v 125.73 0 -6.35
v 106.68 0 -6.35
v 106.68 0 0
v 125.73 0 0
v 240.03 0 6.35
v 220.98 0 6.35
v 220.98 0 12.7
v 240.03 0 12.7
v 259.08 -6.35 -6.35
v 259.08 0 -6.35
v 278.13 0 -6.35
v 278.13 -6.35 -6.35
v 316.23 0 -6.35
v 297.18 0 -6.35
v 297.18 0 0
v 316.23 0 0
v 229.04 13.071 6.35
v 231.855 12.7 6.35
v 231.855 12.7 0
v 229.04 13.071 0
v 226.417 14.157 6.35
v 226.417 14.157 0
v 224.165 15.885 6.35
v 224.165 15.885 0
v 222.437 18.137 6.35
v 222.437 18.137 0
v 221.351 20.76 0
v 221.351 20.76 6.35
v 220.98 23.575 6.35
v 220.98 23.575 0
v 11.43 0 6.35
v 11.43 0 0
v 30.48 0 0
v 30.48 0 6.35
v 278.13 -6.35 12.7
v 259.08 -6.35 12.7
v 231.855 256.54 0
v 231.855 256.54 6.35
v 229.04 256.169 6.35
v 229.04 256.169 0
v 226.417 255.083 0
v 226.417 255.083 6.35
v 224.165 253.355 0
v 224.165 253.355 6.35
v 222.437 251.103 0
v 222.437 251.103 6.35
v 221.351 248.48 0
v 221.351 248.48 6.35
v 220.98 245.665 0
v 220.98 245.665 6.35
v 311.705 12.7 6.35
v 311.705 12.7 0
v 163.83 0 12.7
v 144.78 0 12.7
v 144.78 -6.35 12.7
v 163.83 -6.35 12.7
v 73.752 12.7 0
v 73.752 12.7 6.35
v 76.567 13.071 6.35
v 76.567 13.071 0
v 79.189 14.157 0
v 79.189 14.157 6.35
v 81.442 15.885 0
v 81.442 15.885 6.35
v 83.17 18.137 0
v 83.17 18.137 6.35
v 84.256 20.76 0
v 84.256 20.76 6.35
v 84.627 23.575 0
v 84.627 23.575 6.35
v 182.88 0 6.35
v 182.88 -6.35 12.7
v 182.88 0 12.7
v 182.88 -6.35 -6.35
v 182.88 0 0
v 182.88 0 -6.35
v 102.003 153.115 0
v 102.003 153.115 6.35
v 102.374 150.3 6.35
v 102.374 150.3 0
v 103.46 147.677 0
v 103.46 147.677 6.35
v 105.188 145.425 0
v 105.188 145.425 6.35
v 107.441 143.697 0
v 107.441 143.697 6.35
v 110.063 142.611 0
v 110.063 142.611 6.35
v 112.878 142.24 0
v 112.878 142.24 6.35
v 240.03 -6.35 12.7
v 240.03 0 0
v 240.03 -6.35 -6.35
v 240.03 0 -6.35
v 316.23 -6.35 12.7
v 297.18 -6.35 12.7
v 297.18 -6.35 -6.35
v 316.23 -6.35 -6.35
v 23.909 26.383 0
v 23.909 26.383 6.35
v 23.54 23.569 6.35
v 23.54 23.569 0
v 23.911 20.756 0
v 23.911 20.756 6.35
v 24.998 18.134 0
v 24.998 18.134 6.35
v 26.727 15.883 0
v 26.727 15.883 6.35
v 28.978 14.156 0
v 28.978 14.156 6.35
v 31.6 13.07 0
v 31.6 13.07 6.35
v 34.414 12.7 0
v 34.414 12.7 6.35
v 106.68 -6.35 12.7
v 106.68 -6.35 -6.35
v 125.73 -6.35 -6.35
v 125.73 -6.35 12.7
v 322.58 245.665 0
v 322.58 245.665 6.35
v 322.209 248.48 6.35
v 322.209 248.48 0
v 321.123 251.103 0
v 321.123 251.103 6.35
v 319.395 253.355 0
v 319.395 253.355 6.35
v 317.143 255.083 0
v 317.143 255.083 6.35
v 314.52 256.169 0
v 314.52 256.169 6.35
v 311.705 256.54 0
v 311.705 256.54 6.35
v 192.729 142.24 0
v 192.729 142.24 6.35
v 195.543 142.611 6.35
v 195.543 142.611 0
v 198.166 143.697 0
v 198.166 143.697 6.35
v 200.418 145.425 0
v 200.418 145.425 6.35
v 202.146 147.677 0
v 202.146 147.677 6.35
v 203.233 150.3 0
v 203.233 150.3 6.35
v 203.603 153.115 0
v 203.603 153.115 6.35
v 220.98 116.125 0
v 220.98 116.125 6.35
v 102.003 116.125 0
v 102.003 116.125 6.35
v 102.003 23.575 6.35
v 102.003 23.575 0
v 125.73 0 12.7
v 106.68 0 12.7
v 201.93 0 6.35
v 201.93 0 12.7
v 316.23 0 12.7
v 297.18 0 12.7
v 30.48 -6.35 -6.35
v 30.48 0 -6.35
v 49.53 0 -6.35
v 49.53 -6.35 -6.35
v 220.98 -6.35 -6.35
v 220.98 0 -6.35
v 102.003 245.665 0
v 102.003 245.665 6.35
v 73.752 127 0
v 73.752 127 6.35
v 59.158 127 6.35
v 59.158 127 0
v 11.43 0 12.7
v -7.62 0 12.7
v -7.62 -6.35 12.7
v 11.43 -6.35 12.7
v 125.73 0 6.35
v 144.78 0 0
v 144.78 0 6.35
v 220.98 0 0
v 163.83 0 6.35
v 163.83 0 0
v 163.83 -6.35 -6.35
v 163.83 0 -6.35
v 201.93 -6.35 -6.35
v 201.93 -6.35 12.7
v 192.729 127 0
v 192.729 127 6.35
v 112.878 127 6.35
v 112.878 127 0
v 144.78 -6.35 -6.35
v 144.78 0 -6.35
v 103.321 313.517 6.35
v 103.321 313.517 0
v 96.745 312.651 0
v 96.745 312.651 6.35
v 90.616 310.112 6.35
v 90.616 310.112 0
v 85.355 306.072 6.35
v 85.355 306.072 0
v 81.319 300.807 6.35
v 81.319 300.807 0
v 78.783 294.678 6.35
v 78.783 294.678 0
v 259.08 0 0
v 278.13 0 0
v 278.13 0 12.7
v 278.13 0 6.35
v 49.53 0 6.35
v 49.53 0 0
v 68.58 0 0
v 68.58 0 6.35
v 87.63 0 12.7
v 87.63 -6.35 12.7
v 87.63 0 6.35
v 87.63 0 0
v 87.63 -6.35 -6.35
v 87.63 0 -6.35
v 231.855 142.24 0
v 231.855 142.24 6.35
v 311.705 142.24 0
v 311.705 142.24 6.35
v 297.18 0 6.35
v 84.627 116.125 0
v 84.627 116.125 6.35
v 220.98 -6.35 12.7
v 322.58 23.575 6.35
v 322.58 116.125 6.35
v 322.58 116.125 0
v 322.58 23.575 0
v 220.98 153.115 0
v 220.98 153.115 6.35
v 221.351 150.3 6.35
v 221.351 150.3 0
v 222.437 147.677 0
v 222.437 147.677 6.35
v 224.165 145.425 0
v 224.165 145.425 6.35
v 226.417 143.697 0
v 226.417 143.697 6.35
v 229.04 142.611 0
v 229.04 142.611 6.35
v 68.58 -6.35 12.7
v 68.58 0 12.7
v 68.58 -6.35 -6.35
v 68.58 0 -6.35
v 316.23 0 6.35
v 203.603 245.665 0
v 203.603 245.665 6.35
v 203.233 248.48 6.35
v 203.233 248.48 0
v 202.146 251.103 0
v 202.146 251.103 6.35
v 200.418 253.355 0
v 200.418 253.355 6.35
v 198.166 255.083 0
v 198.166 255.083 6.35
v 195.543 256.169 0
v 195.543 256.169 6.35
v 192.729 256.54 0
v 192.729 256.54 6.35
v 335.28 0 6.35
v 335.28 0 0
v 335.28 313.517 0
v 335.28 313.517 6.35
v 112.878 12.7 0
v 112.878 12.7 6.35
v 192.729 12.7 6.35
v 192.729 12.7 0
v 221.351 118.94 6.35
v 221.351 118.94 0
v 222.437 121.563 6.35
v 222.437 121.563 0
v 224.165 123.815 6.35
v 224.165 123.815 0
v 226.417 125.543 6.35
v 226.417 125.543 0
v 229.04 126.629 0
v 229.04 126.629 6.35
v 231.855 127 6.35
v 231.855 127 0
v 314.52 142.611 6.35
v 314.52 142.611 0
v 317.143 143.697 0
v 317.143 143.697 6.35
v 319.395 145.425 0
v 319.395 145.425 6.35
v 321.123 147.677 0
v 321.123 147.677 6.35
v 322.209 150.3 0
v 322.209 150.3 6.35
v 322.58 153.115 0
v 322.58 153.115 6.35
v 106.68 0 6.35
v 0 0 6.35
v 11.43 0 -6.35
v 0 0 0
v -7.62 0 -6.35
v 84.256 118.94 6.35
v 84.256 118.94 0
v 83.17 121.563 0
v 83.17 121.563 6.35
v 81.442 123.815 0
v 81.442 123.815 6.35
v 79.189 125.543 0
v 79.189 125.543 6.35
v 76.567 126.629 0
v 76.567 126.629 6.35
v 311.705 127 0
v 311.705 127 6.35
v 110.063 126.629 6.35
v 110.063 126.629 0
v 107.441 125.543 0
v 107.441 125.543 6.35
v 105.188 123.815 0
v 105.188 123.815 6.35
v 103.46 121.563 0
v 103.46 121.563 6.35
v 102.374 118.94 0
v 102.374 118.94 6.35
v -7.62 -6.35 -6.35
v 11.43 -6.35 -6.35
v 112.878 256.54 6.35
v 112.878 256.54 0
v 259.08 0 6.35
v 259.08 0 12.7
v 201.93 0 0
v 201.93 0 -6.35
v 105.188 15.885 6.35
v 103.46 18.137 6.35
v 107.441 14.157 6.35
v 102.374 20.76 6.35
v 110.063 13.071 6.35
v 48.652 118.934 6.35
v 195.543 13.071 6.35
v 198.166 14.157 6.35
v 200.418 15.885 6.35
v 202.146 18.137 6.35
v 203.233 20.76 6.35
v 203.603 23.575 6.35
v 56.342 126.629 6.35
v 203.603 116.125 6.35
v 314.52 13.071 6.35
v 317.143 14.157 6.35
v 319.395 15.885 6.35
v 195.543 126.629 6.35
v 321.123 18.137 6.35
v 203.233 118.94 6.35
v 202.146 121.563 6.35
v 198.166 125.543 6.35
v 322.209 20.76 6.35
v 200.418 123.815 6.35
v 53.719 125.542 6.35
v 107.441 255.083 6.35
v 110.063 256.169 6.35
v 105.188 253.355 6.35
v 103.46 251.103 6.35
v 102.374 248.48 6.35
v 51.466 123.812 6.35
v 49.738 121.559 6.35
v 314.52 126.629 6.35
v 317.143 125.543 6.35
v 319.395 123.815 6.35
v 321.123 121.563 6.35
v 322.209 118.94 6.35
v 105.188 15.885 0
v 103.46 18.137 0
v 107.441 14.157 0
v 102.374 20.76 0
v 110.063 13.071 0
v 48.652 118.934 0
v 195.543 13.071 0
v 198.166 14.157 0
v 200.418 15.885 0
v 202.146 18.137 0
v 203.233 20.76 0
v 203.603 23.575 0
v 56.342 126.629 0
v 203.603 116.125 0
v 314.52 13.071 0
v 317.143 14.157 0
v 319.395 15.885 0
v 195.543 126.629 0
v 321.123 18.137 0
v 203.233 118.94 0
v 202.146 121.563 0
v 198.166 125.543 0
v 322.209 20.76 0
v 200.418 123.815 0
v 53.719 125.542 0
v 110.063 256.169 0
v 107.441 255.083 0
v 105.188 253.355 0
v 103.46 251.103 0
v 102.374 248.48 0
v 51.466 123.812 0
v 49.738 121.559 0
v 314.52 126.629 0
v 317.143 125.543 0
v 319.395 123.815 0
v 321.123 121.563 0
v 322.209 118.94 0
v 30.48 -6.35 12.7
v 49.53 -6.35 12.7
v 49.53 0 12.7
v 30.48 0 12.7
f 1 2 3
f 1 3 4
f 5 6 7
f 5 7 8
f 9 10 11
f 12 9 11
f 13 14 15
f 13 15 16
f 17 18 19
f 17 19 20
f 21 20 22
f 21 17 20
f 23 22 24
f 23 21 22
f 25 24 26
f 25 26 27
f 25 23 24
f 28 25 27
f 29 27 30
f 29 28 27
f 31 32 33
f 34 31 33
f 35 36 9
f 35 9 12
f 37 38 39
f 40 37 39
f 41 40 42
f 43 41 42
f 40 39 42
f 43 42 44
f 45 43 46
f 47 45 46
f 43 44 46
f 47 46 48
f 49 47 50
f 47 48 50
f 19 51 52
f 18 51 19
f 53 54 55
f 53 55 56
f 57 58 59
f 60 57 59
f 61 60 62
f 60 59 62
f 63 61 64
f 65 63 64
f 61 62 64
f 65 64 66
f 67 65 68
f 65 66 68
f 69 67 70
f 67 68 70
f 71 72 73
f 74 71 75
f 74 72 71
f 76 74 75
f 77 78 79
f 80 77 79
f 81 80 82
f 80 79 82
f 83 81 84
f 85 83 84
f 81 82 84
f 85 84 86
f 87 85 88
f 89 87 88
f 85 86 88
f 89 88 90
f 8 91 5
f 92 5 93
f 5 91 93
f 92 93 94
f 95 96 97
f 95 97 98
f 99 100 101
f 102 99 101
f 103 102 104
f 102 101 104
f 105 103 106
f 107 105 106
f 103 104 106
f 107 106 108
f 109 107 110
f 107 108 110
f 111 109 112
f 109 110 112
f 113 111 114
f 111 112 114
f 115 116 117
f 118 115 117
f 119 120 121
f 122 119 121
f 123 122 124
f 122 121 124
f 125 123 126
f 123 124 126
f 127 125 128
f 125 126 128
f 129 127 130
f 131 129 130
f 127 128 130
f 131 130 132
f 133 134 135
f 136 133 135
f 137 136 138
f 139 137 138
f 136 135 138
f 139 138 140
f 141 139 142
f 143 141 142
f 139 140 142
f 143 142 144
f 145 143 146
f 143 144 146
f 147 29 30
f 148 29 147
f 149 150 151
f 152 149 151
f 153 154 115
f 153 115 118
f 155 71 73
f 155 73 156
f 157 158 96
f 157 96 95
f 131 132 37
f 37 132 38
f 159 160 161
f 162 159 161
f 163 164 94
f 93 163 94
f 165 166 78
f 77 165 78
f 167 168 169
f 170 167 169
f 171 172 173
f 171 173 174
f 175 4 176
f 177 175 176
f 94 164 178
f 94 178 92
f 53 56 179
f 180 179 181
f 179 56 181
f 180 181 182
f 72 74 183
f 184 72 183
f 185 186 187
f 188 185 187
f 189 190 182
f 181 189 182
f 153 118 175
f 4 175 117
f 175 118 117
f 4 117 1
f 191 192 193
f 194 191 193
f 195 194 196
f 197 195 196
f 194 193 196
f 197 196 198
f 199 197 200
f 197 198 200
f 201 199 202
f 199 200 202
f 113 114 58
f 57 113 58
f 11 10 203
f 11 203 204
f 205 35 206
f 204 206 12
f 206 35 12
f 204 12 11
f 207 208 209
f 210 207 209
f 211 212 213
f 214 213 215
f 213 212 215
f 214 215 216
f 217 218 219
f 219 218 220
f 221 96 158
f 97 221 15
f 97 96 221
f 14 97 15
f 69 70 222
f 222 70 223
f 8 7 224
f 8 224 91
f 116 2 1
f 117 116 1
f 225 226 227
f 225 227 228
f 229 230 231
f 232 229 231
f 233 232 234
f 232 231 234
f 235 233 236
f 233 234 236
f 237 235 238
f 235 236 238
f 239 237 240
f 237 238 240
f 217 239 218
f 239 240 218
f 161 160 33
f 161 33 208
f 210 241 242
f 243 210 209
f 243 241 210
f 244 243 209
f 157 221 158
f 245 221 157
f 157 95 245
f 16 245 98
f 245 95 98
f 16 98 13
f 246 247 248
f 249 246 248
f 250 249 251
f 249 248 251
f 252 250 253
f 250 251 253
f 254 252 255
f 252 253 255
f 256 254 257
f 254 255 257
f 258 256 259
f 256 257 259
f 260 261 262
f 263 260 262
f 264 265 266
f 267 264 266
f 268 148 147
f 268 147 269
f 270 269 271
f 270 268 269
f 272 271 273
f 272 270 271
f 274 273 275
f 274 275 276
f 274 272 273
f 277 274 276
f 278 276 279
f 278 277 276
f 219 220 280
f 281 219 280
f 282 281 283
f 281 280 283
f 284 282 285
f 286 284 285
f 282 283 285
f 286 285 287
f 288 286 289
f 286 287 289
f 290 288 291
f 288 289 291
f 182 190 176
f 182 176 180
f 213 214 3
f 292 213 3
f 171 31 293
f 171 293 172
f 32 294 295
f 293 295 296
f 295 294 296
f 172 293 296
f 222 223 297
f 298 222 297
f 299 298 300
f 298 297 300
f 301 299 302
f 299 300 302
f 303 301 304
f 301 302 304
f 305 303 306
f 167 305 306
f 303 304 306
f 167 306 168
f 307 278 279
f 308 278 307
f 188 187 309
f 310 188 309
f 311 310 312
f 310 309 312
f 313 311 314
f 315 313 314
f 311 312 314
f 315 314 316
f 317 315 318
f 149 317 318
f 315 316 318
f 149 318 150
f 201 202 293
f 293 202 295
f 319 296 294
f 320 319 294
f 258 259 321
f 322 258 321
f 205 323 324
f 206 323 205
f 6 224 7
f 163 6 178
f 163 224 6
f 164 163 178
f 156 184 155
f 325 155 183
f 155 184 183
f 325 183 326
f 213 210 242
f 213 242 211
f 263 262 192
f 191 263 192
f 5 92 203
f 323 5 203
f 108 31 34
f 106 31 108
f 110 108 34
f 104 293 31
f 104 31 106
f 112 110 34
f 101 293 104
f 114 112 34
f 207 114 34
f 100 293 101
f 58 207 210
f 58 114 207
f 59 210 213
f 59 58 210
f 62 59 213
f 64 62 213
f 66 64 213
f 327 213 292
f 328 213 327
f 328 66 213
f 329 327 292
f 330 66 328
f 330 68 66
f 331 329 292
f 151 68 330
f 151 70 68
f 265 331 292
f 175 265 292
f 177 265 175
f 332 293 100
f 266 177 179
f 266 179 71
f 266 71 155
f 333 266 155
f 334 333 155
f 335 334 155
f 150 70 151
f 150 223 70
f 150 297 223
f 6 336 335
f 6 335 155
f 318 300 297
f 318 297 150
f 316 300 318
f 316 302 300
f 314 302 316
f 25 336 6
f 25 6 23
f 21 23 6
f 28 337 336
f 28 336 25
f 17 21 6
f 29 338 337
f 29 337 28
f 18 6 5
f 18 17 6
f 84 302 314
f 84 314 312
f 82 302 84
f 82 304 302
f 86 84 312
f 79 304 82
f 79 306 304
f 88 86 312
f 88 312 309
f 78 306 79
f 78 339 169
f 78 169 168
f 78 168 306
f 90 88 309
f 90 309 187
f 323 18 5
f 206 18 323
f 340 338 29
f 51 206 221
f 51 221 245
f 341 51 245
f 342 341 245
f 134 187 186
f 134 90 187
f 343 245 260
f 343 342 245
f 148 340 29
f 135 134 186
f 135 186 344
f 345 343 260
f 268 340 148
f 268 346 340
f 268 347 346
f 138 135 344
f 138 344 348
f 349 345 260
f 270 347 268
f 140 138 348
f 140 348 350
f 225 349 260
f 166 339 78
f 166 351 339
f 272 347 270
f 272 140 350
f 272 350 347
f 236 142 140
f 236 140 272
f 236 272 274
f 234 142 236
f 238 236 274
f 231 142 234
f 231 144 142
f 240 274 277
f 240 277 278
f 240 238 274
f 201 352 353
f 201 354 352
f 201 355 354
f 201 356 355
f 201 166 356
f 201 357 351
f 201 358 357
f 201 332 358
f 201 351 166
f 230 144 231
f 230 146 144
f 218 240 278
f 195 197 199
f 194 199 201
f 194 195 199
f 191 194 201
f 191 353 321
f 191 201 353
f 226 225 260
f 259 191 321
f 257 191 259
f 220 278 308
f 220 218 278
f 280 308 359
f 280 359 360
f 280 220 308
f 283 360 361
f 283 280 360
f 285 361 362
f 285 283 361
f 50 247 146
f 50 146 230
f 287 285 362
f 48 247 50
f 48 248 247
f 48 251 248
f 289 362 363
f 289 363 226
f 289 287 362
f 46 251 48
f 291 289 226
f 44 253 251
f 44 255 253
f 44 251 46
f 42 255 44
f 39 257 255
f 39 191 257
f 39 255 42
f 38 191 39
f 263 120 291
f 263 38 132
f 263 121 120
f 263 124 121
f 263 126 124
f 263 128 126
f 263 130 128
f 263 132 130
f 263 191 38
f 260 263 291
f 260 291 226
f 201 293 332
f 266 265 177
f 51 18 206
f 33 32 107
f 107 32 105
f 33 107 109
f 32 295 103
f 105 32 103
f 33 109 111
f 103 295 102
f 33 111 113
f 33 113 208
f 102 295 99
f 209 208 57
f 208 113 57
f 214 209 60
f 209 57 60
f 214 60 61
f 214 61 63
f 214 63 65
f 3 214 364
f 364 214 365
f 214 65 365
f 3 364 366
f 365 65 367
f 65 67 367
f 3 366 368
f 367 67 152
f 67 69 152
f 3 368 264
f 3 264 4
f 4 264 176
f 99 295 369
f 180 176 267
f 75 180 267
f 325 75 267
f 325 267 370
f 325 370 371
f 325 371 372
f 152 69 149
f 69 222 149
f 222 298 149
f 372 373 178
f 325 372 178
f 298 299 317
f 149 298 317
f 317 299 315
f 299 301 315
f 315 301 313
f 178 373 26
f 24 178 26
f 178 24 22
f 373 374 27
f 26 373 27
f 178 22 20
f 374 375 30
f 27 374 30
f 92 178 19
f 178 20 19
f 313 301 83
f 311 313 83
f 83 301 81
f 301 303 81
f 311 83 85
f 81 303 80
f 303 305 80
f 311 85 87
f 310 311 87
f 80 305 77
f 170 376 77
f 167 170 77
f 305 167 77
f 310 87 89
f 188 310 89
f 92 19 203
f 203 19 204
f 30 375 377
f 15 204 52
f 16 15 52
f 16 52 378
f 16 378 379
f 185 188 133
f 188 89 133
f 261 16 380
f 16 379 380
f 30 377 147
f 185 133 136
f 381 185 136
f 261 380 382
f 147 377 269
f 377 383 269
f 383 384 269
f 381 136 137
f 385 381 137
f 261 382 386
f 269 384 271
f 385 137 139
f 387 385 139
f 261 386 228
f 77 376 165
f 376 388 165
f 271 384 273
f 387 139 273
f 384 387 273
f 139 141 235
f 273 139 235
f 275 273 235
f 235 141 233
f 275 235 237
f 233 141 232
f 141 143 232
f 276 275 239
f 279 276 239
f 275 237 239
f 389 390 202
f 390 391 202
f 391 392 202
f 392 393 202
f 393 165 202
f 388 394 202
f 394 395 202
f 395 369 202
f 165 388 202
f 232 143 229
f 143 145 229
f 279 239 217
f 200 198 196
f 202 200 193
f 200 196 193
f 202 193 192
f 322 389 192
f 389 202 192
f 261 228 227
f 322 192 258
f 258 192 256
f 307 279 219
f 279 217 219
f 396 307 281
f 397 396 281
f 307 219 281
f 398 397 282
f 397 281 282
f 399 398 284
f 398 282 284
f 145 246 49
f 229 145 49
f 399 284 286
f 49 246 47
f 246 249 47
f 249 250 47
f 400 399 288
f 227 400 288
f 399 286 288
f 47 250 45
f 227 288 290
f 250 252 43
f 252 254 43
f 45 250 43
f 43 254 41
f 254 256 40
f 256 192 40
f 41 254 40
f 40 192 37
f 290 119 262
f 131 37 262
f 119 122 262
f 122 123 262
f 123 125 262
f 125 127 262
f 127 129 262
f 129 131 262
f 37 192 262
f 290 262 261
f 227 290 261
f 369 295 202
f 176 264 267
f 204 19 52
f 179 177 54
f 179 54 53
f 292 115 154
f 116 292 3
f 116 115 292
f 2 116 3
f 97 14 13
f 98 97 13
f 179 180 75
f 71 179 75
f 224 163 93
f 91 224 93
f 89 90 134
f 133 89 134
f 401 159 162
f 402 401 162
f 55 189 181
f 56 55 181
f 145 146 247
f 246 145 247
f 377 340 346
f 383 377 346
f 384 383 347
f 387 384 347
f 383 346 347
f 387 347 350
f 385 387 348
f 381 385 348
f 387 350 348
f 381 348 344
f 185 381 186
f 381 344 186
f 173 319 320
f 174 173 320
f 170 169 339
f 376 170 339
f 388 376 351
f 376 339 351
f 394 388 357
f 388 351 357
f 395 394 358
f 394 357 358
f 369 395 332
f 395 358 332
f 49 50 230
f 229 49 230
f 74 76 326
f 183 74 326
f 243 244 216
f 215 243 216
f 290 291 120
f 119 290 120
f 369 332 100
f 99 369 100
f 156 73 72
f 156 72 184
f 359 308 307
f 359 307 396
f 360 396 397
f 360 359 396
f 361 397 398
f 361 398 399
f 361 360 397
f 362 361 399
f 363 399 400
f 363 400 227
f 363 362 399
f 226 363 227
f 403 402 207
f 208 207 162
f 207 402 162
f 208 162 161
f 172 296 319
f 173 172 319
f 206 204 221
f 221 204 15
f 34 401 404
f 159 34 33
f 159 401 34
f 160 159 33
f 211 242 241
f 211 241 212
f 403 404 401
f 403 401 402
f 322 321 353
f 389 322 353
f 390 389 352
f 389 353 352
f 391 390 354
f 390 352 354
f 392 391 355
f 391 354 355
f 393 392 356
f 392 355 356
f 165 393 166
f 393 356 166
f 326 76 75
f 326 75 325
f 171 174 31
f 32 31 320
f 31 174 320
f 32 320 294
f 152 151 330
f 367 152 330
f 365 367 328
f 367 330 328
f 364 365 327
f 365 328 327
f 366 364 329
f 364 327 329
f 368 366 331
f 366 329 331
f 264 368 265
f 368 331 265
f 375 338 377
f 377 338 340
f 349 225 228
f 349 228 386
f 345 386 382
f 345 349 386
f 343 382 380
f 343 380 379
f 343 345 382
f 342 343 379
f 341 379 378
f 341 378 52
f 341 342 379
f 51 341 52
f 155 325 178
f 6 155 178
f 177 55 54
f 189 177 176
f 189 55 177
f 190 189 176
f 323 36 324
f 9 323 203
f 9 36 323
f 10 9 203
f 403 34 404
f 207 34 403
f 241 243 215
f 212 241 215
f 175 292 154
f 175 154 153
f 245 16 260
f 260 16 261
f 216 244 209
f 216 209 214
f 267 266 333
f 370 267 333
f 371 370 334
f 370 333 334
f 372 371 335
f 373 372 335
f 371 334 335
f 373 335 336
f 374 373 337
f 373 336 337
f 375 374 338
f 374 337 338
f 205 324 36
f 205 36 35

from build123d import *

# Parameters (mm, degrees)
BOSS_EXTRUDE1_DEPTH      = 6.35
CUT_EXTRUDE1_DEPTH       = 6.35
BOSS_EXTRUDE2_DEPTH      = 6.35
BOSS_EXTRUDE2_DEPTH_BACK = 12.7
SKETCH3_W                = 19.05
SKETCH3_H                = 6.35


with BuildPart() as part:
    # Sketch1 → Boss-Extrude1 (new body)
    with BuildSketch(Plane.XY):
        with BuildLine():
            Line((0, 0), (335.28, 0))
            Line((335.28, 0), (335.28, 313.51728))
            Line((335.28, 313.51728), (103.321320582, 313.51728))
            ThreePointArc((103.321320582, 313.51728), (87.853181888, 308.264157806), (78.783155215, 294.677648925))
            Line((78.783155215, 294.677648925), (0, 0))
        make_face()
    extrude(amount=BOSS_EXTRUDE1_DEPTH)

    # Sketch2 → Cut-Extrude1 (cut)
    with BuildSketch(Plane.XY.offset(6.35)):
        with BuildLine():
            Line((311.705446202, 12.7), (231.854553798, 12.7))
            ThreePointArc((231.854553798, 12.7), (224.165083065, 15.885083065), (220.98, 23.574553798))
            Line((220.98, 23.574553798), (220.98, 116.125446202))
            ThreePointArc((220.98, 116.125446202), (224.165083065, 123.814916935), (231.854553798, 127))
            Line((231.854553798, 127), (311.705446202, 127))
            ThreePointArc((311.705446202, 127), (319.394916935, 123.814916935), (322.58, 116.125446202))
            Line((322.58, 116.125446202), (322.58, 23.574553798))
            ThreePointArc((322.58, 23.574553798), (319.394916935, 15.885083065), (311.705446202, 12.7))
        make_face()
        with BuildLine():
            Line((203.603317785, 23.574553798), (203.603317785, 116.125446202))
            ThreePointArc((203.603317785, 116.125446202), (200.41823472, 123.814916935), (192.728763987, 127))
            Line((192.728763987, 127), (112.877871584, 127))
            ThreePointArc((112.877871584, 127), (105.18840085, 123.814916935), (102.003317785, 116.125446202))
            Line((102.003317785, 116.125446202), (102.003317785, 23.574553798))
            ThreePointArc((102.003317785, 23.574553798), (105.18840085, 15.885083065), (112.877871584, 12.7))
            Line((112.877871584, 12.7), (192.728763987, 12.7))
            ThreePointArc((192.728763987, 12.7), (200.41823472, 15.885083065), (203.603317785, 23.574553798))
        make_face()
        with BuildLine():
            Line((84.62663557, 23.574553798), (84.62663557, 116.125446202))
            ThreePointArc((84.62663557, 116.125446202), (81.441552505, 123.814916935), (73.752081772, 127))
            Line((73.752081772, 127), (59.157987156, 127))
            ThreePointArc((59.157987156, 127), (52.535581392, 124.750970083), (48.652412376, 118.934150328))
            Line((48.652412376, 118.934150328), (23.908590277, 26.383257925))
            ThreePointArc((23.908590277, 26.383257925), (25.788641176, 16.952148035), (34.414165057, 12.7))
            Line((34.414165057, 12.7), (73.752081772, 12.7))
            ThreePointArc((73.752081772, 12.7), (81.441552505, 15.885083065), (84.62663557, 23.574553798))
        make_face()
        with BuildLine():
            Line((203.603317785, 153.114553798), (203.603317785, 245.665446202))
            ThreePointArc((203.603317785, 245.665446202), (200.41823472, 253.354916935), (192.728763987, 256.54))
            Line((192.728763987, 256.54), (112.877871584, 256.54))
            ThreePointArc((112.877871584, 256.54), (105.18840085, 253.354916935), (102.003317785, 245.665446202))
            Line((102.003317785, 245.665446202), (102.003317785, 153.114553798))
            ThreePointArc((102.003317785, 153.114553798), (105.18840085, 145.425083065), (112.877871584, 142.24))
            Line((112.877871584, 142.24), (192.728763987, 142.24))
            ThreePointArc((192.728763987, 142.24), (200.41823472, 145.425083065), (203.603317785, 153.114553798))
        make_face()
        with BuildLine():
            Line((322.58, 153.114553798), (322.58, 245.665446202))
            ThreePointArc((322.58, 245.665446202), (319.394916935, 253.354916935), (311.705446202, 256.54))
            Line((311.705446202, 256.54), (231.854553798, 256.54))
            ThreePointArc((231.854553798, 256.54), (224.165083065, 253.354916935), (220.98, 245.665446202))
            Line((220.98, 245.665446202), (220.98, 153.114553798))
            ThreePointArc((220.98, 153.114553798), (224.165083065, 145.425083065), (231.854553798, 142.24))
            Line((231.854553798, 142.24), (311.705446202, 142.24))
            ThreePointArc((311.705446202, 142.24), (319.394916935, 145.425083065), (322.58, 153.114553798))
        make_face()
    extrude(amount=-CUT_EXTRUDE1_DEPTH, mode=Mode.SUBTRACT)

    # Sketch3 → Boss-Extrude2 (add, two sides: drawn at the far end of the back side and taken through both)
    with BuildSketch(Plane.XY.offset(6.35).offset(-BOSS_EXTRUDE2_DEPTH_BACK)):
        Polygon((11.43, -6.35), (11.43, 0), (0, 0), (-7.62, 0), (-7.62, -6.35), align=None)
        with Locations((40.005, -3.175)):
            Rectangle(SKETCH3_W, SKETCH3_H)
        with Locations((78.105, -3.175)):
            Rectangle(SKETCH3_W, SKETCH3_H)
        with Locations((116.205, -3.175)):
            Rectangle(SKETCH3_W, SKETCH3_H)
        with Locations((154.305, -3.175)):
            Rectangle(SKETCH3_W, SKETCH3_H)
        with Locations((192.405, -3.175)):
            Rectangle(SKETCH3_W, SKETCH3_H)
        with Locations((230.505, -3.175)):
            Rectangle(SKETCH3_W, SKETCH3_H)
        with Locations((268.605, -3.175)):
            Rectangle(SKETCH3_W, SKETCH3_H)
        with Locations((306.705, -3.175)):
            Rectangle(SKETCH3_W, SKETCH3_H)
    extrude(amount=BOSS_EXTRUDE2_DEPTH + BOSS_EXTRUDE2_DEPTH_BACK)


solid = part.part
